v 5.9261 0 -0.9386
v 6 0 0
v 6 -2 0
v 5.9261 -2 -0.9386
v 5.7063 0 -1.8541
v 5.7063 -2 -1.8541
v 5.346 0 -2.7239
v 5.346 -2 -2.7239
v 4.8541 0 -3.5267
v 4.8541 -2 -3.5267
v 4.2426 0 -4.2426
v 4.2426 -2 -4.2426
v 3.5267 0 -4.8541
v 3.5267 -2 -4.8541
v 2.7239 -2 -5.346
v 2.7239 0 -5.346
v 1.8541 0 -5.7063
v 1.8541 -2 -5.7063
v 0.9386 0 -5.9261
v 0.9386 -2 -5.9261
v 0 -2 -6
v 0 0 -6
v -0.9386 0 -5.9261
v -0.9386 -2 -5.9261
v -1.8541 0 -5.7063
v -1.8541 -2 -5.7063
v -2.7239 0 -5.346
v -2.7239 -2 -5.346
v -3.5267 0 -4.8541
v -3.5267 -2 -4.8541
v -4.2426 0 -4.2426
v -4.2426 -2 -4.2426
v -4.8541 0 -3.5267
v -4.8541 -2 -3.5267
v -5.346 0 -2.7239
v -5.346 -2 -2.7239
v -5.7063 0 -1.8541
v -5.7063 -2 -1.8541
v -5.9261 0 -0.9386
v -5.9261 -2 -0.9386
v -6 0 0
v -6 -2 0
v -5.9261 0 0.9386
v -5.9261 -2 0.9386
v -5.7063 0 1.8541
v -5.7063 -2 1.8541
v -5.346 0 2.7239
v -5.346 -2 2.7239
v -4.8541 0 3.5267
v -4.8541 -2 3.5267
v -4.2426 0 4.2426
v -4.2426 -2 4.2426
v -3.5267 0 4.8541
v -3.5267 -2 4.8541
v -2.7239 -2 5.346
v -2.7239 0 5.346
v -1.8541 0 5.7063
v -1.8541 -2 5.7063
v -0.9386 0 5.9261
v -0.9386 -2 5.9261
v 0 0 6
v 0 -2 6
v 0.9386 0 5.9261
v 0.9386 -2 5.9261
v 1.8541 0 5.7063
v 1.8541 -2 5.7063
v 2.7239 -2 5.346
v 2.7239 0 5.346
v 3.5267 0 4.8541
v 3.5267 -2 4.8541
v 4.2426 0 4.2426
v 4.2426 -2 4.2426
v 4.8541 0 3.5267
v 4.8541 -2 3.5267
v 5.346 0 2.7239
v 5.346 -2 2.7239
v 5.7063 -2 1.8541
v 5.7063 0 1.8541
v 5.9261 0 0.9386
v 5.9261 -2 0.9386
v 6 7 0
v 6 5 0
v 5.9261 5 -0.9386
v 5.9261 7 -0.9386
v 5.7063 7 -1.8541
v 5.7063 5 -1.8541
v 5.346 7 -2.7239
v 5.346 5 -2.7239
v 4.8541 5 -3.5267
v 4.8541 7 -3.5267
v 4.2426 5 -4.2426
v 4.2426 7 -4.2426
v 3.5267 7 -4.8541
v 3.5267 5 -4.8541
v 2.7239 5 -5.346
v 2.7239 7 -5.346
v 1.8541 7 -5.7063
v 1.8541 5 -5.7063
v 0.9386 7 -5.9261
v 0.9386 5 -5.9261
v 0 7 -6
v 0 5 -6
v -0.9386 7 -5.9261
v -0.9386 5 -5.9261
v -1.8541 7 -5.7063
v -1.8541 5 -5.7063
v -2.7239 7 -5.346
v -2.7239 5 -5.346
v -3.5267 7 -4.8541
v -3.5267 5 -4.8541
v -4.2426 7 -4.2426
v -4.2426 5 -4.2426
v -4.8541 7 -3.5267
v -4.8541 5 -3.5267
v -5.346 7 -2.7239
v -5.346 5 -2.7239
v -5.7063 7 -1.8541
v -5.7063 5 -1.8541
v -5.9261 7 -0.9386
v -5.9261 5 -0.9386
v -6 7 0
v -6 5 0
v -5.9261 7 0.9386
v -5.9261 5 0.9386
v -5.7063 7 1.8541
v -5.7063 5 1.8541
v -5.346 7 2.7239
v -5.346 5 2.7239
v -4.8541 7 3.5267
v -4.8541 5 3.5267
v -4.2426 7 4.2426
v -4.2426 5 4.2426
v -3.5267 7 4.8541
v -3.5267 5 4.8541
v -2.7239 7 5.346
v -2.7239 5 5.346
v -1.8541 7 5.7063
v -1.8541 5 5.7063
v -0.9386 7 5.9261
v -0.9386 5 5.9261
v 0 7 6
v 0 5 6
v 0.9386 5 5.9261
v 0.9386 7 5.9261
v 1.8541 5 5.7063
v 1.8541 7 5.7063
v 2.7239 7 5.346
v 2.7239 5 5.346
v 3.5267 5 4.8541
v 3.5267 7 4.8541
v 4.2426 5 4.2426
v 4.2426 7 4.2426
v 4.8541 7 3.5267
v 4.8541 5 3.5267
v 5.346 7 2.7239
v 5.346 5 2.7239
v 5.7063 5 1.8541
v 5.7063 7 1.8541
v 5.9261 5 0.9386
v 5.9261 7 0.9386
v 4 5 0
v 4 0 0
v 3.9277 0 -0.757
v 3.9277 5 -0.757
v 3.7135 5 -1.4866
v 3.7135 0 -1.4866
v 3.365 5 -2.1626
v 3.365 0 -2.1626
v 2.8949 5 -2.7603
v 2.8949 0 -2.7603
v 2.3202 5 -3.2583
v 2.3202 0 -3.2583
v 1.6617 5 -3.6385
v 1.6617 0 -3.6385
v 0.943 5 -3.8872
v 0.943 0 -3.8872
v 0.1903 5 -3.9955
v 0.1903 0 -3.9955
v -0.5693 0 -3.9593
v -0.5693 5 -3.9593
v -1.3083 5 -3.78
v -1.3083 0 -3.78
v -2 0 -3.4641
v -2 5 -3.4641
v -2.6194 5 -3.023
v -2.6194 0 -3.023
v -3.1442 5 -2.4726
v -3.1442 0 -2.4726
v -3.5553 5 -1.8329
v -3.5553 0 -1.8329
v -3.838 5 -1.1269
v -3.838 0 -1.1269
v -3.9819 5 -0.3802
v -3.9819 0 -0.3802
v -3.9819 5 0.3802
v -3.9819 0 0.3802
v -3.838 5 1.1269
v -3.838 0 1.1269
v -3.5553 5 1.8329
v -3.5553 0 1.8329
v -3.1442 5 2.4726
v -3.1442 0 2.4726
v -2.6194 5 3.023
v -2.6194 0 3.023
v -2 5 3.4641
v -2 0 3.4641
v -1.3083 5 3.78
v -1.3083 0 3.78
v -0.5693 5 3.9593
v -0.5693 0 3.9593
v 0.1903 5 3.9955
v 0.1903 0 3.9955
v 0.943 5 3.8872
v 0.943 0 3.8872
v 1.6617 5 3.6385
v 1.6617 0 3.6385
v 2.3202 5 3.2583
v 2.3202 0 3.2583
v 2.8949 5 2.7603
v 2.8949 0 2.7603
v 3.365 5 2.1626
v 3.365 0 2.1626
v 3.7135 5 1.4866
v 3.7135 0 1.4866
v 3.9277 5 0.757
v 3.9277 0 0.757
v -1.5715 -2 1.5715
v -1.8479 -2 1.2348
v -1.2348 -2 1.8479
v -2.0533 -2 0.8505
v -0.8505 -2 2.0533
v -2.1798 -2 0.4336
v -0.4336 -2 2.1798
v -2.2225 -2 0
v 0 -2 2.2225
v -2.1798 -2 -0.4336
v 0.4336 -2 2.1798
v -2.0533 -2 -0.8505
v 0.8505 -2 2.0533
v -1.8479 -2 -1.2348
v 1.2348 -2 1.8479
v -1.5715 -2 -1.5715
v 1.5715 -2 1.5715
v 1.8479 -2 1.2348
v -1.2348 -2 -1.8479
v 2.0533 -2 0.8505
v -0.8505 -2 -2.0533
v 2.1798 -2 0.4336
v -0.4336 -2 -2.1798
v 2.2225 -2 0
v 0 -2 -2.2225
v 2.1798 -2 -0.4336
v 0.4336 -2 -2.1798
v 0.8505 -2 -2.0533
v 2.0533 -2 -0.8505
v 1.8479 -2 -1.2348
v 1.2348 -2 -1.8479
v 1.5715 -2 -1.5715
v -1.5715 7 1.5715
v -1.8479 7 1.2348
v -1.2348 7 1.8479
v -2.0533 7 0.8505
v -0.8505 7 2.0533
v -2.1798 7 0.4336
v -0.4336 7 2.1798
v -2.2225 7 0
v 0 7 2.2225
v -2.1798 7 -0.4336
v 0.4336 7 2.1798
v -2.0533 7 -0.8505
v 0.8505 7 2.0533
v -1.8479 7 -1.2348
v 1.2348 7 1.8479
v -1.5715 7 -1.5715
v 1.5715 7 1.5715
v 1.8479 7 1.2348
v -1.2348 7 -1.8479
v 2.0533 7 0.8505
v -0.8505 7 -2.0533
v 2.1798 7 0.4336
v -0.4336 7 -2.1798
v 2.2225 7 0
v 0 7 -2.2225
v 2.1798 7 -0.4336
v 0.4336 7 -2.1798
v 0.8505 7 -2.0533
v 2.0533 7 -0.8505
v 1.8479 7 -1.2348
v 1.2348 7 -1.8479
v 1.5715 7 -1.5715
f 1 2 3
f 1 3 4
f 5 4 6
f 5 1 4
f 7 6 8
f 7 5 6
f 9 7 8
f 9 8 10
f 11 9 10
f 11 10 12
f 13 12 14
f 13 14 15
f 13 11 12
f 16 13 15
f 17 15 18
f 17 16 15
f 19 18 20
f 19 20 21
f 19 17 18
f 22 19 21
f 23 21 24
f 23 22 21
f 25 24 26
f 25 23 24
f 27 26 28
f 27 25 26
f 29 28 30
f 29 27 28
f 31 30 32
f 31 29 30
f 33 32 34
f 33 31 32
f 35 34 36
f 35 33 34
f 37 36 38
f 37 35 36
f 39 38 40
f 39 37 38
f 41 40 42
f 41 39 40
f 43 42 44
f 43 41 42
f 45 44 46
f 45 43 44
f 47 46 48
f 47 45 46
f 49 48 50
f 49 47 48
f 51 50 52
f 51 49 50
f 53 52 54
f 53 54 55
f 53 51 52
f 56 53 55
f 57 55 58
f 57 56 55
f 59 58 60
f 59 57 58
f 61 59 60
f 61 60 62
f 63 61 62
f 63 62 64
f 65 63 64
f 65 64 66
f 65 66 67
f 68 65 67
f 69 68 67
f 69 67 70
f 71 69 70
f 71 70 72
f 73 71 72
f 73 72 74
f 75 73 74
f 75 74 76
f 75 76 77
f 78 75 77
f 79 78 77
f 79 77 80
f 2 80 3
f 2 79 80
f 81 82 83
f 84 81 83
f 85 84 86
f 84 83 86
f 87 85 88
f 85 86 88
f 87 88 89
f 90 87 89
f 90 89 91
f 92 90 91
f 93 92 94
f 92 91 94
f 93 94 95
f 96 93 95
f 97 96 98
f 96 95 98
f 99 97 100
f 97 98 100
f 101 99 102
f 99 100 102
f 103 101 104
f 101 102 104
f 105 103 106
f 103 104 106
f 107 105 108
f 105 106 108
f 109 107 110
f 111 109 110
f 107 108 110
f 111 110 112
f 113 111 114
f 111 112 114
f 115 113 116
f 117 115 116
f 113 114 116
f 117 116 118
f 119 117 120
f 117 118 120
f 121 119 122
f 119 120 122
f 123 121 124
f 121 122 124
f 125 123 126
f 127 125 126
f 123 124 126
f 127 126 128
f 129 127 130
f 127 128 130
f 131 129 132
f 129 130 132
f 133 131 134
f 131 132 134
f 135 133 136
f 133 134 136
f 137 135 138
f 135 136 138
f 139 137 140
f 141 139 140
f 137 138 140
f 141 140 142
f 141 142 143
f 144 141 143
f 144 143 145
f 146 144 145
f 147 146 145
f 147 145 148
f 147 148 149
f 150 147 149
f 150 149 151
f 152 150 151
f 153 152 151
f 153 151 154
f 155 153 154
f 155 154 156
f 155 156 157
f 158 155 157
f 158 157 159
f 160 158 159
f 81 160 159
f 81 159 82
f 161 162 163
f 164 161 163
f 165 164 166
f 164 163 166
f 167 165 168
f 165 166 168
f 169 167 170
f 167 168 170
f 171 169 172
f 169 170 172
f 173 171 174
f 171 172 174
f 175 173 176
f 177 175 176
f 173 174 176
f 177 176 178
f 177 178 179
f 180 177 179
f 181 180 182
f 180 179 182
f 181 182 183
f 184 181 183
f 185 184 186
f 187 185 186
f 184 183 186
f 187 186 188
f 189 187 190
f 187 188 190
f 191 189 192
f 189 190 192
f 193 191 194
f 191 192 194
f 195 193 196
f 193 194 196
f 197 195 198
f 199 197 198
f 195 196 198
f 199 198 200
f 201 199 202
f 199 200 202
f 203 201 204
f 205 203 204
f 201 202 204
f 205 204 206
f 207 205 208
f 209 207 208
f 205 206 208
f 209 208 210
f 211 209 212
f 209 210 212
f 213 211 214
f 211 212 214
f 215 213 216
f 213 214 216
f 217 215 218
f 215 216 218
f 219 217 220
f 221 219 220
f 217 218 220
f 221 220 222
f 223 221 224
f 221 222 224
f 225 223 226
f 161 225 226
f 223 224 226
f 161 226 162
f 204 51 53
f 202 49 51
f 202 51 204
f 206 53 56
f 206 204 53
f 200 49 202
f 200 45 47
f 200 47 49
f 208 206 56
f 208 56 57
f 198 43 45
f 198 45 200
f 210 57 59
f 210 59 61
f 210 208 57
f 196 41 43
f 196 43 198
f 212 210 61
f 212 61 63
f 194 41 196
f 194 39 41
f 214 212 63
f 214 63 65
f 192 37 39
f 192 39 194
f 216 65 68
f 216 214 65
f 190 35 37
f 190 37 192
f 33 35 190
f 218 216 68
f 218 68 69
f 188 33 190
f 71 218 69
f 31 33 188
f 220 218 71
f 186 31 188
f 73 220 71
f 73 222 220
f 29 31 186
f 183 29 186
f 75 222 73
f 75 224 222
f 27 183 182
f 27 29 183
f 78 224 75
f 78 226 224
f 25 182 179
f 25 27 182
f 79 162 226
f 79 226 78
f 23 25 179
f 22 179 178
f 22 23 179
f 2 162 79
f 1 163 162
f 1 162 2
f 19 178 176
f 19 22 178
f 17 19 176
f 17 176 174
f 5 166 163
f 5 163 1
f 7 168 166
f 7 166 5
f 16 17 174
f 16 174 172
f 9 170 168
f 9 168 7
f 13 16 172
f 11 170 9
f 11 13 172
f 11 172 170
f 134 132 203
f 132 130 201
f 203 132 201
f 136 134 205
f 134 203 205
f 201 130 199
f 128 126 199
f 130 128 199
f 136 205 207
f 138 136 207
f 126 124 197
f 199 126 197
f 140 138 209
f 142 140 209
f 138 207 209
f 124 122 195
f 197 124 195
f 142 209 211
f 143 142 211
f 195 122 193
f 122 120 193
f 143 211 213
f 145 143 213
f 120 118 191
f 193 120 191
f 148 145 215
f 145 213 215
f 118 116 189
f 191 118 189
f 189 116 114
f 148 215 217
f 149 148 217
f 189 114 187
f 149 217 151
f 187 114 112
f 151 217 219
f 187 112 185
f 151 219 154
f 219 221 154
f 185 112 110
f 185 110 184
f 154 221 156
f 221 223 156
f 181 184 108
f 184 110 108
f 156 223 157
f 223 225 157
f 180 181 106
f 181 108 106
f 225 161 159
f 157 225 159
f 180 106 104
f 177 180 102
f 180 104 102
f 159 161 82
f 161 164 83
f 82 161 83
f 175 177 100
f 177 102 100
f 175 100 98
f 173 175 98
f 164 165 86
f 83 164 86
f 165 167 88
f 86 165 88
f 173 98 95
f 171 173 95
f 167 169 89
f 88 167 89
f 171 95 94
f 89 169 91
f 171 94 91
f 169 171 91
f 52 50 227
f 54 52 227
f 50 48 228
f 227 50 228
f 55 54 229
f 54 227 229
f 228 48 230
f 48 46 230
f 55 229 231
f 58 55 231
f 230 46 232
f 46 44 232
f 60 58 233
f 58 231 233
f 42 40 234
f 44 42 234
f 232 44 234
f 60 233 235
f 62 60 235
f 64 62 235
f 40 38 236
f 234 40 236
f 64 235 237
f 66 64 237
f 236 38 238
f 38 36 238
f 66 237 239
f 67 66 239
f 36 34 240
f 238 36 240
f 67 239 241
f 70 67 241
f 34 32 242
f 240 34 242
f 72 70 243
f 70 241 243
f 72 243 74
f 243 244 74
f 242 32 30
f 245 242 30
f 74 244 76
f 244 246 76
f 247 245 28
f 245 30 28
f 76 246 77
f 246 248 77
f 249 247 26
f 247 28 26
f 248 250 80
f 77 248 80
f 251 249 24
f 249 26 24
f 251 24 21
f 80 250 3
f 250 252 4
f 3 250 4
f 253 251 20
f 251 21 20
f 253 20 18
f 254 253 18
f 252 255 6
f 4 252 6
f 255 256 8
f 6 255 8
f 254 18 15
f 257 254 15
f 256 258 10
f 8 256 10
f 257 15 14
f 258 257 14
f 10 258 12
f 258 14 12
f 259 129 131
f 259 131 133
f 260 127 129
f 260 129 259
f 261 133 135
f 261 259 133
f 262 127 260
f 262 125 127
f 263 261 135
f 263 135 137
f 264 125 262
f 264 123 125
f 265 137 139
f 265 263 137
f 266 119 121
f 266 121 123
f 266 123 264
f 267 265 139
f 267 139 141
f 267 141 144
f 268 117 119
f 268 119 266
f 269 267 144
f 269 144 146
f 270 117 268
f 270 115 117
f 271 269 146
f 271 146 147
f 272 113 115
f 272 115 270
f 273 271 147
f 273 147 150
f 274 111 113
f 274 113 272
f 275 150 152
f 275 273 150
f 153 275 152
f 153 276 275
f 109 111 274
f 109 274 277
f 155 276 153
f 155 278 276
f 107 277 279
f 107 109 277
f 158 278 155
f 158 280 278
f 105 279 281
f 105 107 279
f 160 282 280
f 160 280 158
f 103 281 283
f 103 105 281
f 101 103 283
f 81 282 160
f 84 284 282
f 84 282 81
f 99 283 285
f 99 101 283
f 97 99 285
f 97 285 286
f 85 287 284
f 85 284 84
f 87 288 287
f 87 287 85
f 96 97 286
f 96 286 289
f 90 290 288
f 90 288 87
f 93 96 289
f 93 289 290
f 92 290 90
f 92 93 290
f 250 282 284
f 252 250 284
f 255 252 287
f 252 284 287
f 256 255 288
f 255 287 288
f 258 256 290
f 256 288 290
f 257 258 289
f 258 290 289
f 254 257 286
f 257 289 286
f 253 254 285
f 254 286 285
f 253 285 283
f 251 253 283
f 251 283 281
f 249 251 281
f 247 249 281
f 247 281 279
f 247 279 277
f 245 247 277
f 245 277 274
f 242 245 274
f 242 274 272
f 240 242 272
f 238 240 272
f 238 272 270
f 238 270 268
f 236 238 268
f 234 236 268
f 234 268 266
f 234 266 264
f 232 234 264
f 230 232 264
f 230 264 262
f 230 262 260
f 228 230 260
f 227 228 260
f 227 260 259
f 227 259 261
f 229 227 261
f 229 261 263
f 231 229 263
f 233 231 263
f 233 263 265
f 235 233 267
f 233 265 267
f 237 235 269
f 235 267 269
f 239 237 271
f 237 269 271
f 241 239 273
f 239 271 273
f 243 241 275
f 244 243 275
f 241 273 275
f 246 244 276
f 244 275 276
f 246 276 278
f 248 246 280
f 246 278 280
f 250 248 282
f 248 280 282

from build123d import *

# Parameters (mm, degrees)
SKETCH1_R           = 4
BOSS_EXTRUDE1_DEPTH = 5
SKETCH2_R           = 6
BOSS_EXTRUDE2_DEPTH = 2
SKETCH3_R           = 2.2225
CUT_EXTRUDE1_DEPTH  = 10


with BuildPart() as part:
    # Sketch1 → Boss-Extrude1 (new body)
    with BuildSketch(Plane(origin=(0, 0, 0), x_dir=(1, 0, 0), z_dir=(0, 1, 0))):
        Circle(SKETCH1_R)
    extrude(amount=BOSS_EXTRUDE1_DEPTH)

    # Sketch2 → Boss-Extrude2 (add)
    with BuildSketch(Plane(origin=(0, 5, 0), x_dir=(1, 0, 0), z_dir=(0, 1, 0))):
        Circle(SKETCH2_R)
    boss_extrude2 = extrude(amount=BOSS_EXTRUDE2_DEPTH)

    # Mirror1: Boss-Extrude2 across plane
    add(boss_extrude2.mirror(Plane(origin=(0, 2.5, 0), x_dir=(0, 0, 1), z_dir=(0, -1, 0))))

    # Sketch3 → Cut-Extrude1 (cut, through all)
    with BuildSketch(Plane(origin=(0, 7, 0), x_dir=(1, 0, 0), z_dir=(0, 1, 0))):
        Circle(SKETCH3_R)
    extrude(amount=-CUT_EXTRUDE1_DEPTH, mode=Mode.SUBTRACT)


solid = part.part
